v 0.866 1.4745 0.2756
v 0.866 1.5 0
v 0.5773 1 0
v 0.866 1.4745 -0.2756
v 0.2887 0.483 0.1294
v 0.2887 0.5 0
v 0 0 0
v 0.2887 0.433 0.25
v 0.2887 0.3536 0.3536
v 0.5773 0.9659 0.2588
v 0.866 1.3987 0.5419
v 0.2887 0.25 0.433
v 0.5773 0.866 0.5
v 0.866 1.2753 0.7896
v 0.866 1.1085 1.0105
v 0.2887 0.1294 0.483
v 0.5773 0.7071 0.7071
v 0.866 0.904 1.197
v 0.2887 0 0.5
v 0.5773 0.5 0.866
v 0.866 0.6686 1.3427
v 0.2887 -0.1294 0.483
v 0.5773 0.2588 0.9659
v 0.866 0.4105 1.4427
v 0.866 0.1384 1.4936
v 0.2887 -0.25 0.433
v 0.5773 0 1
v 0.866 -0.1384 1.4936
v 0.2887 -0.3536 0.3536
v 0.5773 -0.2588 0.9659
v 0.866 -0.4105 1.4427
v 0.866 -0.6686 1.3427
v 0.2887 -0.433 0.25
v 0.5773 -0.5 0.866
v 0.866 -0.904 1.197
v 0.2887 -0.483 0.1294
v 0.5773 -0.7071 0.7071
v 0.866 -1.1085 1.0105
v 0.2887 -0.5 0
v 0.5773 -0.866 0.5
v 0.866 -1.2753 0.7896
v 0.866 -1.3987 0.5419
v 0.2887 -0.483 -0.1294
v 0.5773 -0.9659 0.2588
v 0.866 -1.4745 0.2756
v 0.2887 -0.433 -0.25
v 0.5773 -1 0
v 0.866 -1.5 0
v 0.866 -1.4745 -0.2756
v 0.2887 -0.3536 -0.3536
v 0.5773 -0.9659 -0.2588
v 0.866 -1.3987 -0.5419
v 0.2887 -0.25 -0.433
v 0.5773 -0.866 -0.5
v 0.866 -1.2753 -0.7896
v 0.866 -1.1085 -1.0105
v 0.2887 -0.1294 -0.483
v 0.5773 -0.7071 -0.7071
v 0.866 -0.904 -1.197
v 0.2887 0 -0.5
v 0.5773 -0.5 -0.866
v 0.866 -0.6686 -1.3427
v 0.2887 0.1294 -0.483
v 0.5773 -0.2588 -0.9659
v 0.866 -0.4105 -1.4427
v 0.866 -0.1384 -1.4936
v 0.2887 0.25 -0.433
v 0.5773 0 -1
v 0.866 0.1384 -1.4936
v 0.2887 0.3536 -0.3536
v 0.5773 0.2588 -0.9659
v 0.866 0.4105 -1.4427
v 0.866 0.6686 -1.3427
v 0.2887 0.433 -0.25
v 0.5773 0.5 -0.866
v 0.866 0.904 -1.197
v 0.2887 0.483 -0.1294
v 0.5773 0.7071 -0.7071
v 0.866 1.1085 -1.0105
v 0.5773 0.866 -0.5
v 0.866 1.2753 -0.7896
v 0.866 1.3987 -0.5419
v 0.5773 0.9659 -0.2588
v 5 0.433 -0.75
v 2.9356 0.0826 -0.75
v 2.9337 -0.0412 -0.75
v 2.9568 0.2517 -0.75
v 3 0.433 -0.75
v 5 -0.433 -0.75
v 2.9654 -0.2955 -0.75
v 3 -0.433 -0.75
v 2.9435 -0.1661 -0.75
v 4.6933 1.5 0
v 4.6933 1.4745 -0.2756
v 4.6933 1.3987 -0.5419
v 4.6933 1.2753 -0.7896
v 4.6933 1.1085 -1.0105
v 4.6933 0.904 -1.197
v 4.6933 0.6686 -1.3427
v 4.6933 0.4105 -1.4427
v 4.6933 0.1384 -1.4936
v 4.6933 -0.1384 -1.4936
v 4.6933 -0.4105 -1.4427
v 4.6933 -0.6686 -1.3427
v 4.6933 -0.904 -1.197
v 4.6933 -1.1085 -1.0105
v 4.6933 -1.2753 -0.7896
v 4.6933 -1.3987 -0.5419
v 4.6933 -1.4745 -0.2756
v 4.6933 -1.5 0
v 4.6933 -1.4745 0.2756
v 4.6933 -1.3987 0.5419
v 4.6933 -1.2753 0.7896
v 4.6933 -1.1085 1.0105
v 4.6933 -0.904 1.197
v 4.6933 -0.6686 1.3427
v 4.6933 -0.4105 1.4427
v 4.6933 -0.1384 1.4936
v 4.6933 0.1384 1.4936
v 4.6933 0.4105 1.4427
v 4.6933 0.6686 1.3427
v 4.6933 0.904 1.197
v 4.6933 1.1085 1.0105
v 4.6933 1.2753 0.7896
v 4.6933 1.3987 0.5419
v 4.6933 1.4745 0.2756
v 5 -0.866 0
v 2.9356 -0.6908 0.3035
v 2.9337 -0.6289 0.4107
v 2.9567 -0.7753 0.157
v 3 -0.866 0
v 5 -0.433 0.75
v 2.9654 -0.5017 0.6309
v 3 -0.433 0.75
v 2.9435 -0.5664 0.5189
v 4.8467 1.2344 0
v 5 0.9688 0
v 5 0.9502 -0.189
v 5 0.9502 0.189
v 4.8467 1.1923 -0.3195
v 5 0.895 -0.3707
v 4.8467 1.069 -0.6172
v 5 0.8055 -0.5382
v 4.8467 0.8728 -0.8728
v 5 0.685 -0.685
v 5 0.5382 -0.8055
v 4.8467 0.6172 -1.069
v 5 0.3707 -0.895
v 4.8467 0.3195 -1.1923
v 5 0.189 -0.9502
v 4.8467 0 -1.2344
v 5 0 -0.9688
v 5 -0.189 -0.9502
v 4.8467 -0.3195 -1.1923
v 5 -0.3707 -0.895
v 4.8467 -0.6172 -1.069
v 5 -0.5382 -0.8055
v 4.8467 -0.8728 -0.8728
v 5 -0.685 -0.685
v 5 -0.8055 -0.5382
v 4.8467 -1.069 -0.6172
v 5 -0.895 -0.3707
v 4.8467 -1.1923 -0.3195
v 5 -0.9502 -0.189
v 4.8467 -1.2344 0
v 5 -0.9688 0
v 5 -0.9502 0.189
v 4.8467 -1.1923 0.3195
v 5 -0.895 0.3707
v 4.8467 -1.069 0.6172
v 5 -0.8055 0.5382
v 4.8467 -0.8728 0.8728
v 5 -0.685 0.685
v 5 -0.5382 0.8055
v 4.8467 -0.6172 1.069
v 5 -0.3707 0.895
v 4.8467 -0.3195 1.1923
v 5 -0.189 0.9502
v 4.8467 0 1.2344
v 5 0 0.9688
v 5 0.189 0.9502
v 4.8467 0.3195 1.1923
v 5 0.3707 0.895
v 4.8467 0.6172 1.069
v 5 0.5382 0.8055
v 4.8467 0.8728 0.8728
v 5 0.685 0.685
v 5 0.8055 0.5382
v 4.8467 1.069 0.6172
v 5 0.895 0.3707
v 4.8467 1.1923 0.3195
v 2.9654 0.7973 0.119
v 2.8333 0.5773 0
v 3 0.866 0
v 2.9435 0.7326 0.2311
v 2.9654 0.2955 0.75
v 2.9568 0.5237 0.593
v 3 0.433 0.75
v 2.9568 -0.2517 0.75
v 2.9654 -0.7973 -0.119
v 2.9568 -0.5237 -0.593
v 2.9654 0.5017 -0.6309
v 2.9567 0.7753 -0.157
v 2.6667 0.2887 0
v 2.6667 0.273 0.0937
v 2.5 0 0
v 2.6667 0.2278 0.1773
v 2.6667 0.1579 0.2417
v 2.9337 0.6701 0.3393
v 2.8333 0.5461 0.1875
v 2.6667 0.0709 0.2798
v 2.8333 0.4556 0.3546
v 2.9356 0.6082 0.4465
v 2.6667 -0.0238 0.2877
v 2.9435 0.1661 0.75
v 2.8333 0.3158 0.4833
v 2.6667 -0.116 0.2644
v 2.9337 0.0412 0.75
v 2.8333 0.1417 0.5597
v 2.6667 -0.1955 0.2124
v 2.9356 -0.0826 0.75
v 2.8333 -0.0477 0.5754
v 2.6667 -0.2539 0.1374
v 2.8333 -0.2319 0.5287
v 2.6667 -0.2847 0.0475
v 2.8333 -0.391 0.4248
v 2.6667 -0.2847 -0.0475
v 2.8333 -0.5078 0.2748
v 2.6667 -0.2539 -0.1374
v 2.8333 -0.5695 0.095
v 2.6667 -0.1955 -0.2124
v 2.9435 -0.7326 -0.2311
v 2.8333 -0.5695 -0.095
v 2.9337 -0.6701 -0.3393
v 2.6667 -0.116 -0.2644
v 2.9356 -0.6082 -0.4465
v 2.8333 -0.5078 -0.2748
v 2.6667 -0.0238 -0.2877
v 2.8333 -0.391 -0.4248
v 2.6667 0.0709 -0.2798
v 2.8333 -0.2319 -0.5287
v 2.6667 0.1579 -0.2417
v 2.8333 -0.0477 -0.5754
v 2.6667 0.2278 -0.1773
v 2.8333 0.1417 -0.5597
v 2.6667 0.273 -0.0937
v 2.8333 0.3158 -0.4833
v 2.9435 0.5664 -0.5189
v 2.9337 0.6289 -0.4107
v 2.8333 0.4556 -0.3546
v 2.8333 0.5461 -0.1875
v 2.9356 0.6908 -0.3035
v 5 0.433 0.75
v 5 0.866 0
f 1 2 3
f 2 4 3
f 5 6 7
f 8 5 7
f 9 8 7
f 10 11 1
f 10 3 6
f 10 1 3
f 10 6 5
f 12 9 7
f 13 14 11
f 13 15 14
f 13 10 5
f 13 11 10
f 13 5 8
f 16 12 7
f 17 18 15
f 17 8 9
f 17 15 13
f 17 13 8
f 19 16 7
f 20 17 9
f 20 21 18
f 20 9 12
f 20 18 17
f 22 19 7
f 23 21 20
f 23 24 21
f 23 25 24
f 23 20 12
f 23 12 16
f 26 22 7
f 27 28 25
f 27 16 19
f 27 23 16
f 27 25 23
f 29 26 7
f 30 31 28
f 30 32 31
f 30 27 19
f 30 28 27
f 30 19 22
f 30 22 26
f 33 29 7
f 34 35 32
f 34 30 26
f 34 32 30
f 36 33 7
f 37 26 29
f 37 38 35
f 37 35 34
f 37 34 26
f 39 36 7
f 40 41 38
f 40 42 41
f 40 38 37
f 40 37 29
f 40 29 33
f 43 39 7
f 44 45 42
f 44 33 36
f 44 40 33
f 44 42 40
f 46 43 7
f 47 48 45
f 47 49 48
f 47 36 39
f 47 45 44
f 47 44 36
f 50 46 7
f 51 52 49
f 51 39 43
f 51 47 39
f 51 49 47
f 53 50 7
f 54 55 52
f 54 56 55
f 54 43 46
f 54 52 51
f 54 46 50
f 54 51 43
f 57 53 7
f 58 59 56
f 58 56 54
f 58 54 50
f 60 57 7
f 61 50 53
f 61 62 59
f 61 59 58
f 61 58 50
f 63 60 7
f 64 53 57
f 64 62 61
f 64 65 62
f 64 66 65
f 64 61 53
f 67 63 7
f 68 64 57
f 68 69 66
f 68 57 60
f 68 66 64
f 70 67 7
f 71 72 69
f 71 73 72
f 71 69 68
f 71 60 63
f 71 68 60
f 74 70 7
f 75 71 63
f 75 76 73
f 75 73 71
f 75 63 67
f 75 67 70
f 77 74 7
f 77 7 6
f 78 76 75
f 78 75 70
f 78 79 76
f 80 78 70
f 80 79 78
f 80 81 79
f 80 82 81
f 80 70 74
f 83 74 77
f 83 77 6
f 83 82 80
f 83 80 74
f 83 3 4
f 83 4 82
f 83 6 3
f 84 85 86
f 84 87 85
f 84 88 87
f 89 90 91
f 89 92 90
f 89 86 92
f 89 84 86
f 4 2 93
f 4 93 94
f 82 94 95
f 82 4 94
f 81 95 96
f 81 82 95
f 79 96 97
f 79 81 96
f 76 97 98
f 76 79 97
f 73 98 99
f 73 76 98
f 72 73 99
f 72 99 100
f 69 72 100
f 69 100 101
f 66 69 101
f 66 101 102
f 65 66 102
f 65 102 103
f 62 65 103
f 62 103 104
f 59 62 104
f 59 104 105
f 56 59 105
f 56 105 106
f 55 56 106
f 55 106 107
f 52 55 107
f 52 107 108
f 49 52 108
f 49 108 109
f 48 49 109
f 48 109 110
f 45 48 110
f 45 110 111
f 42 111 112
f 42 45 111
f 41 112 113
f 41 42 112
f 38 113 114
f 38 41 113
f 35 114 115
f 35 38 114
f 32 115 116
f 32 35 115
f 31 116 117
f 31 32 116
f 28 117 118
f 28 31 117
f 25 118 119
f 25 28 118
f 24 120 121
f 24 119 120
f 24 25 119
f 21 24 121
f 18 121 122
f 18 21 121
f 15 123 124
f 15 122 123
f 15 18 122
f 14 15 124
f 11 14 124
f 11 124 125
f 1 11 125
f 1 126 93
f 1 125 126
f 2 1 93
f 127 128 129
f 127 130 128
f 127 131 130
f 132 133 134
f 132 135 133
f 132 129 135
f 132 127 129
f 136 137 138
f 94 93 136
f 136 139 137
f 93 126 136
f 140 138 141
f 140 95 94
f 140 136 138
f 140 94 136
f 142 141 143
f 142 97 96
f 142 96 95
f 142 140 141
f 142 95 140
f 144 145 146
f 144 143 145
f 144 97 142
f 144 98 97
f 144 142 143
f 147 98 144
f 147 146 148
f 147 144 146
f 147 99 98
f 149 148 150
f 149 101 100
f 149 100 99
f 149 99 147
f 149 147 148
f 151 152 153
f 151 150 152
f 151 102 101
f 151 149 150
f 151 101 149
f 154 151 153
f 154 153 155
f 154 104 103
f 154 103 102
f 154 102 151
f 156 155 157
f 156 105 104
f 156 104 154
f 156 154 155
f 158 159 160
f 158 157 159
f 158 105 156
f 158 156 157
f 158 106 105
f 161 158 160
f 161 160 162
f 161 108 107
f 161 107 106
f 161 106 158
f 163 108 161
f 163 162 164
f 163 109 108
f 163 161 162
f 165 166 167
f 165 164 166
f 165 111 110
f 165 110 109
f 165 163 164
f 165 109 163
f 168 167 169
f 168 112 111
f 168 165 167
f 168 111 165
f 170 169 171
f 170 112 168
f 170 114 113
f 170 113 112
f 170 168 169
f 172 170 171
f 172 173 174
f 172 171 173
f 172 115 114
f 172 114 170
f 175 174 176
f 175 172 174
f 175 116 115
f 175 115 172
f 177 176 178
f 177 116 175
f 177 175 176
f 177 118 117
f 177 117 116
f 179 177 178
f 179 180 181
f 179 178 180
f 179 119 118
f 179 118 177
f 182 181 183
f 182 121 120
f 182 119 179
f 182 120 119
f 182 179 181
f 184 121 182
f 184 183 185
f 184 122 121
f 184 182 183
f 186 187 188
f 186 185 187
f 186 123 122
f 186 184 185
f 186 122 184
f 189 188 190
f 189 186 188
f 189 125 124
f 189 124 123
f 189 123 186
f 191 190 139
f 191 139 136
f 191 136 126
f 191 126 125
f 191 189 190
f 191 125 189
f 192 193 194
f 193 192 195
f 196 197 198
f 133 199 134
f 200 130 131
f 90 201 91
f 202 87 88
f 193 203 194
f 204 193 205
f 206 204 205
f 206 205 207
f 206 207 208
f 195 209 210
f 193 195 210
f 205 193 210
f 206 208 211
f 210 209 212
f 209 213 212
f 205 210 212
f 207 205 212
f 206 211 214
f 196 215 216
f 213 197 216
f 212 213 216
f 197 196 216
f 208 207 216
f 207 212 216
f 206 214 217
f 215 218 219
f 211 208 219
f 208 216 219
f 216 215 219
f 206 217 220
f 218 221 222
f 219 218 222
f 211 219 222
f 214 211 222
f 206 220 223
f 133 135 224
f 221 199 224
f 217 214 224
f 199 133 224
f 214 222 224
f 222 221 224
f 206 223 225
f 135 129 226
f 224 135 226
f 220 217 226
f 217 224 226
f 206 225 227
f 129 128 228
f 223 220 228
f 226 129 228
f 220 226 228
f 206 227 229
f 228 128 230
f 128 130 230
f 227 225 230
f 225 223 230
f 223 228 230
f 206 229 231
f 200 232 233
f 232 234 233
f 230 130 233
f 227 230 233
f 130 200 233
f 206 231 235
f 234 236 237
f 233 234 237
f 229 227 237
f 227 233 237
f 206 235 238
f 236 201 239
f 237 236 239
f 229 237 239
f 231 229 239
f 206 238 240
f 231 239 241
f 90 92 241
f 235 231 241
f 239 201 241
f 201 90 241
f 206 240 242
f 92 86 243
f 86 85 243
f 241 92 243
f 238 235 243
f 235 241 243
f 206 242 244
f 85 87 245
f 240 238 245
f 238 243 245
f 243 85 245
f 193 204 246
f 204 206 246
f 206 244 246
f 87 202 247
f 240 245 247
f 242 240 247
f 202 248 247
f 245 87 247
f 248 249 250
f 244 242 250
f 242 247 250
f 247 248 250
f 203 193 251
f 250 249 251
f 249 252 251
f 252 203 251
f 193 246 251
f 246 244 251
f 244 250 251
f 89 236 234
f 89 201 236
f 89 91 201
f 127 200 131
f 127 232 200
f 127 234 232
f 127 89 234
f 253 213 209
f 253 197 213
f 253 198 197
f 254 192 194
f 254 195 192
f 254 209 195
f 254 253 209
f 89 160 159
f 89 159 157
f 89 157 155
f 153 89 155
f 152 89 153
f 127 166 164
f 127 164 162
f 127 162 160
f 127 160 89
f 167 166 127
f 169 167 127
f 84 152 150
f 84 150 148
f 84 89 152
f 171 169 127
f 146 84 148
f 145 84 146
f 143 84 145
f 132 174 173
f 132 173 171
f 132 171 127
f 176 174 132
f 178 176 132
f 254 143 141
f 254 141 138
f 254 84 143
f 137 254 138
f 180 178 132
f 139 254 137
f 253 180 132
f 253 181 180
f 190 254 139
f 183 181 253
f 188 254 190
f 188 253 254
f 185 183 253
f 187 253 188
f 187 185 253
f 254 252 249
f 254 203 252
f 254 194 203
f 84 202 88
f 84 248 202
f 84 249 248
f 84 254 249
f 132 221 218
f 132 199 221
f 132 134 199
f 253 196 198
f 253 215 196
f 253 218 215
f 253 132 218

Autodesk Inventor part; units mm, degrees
ref_plane "YZ Plane" through (0, 0, 0) normal (1, 0, 0) x (0, 1, 0)
ref_plane "XZ Plane" through (0, 0, 0) normal (0, 1, 0) x (-1, 0, 0)
sketch "Sketch1" plane through (0, 0, 0) normal (0, 0, 1) x (1, 0, 0)
  line L0 (0, 0) -> (2.5, 0)
  line L1 (5, 0.866) -> (5, 1.5)
  line L2 (5, 1.5) -> (0, 1.5)
  line L3 (5, 0.866) -> (3, 0.866)
  line L4 (3, 0.866) -> (2.5, 0)
  line L5 (0, -0.3) -> (0, 1.8) projected
  line L6 (0, 1.5) -> (0, 0)
  dimension "d0" = 2
  dimension "d1" = 60
  dimension "d2" = 3
  dimension "d3" = 1.7321
  dimension "d5" = 5
revolve "Body" add sketch "Sketch1" angle 360 about axis through (0, 0, 0) along (1, 0, 0)
sketch "Sketch2" plane through (5, 0, 0) normal (1, 0, 0) x (0, 1, 0)
  circle A0 centre (0, 0) radius 0.866 projected
  line L0 (-0.433, 0.75) -> (0.433, 0.75)
  line L1 (0.433, 0.75) -> (0.866, 0)
  line L2 (0.866, 0) -> (0.433, -0.75)
  line L3 (0.433, -0.75) -> (-0.433, -0.75)
  line L4 (-0.433, -0.75) -> (-0.866, 0)
  line L5 (-0.866, 0) -> (-0.433, 0.75)
  point P0 (0, 0)
  point P1 (0, 0)
extrude "Slot" add sketch "Sketch2" against normal up to next contours L1 A0 | A0 L2 | L0 A0 | A0 L3 | L5 A0 | A0 L4
thread "Thread" size "M3x0.5" class "6g" standard "ISO Metric profile" length 5
chamfer "Chamfer1" distance 0.866 angle 60 1 edges at (0, -1.5, 0) measured on face at (3.3333, 1.4951, -0.1207)
chamfer "Chamfer2" distance 0.3067 angle 60 1 edges at (5, -1.5, 0) measured on face at (3.6218, 1.4951, -0.1207)
ref_plane "Work Plane1" through (2.5, 0, 0) normal (0, 0, 1) x (1, 0, 0)
equation "\"d0\" = INTI"
equation "\"d2\" = NND"
equation "\"d3\" = 1.1547 * SW"
equation "\"d5\" = NLG"
equation "\"d12\" = NLG"
equation "\"d9\" = FAWI"
equation "\"d10\" = -0.5 * GD1 + 0.5 * NND"
equation "\"d11\" = FAWI"
equation "\"d35\" = -0.5 * GD1 + 0.5 * NND"
equation "\"NND\" = 3"
equation "\"NLG\" = 5"
equation "\"INTI\" = 2"
equation "\"FAWI\" = 60deg"
equation "\"SW\" = 1.5"
equation "\"GD1\" = THREADDIA - 1.2269 * PTC"
equation "\"FAWI1\" = 45deg"
equation "\"SPD\" = 0.00001"
equation "\"GUL\" = 0.61345 * PTC"
equation "\"TOA\" = 30deg"
equation "\"THREADDIA\" = 3"
equation "\"PTC\" = 0.5"
equation "\"GAL\" = 0.61345 * PTC"
equation "\"E0\" = 1.155 * SW"
properties part number "AS 1421 - M3x5 Cone Point" material "Steel, Mild"
